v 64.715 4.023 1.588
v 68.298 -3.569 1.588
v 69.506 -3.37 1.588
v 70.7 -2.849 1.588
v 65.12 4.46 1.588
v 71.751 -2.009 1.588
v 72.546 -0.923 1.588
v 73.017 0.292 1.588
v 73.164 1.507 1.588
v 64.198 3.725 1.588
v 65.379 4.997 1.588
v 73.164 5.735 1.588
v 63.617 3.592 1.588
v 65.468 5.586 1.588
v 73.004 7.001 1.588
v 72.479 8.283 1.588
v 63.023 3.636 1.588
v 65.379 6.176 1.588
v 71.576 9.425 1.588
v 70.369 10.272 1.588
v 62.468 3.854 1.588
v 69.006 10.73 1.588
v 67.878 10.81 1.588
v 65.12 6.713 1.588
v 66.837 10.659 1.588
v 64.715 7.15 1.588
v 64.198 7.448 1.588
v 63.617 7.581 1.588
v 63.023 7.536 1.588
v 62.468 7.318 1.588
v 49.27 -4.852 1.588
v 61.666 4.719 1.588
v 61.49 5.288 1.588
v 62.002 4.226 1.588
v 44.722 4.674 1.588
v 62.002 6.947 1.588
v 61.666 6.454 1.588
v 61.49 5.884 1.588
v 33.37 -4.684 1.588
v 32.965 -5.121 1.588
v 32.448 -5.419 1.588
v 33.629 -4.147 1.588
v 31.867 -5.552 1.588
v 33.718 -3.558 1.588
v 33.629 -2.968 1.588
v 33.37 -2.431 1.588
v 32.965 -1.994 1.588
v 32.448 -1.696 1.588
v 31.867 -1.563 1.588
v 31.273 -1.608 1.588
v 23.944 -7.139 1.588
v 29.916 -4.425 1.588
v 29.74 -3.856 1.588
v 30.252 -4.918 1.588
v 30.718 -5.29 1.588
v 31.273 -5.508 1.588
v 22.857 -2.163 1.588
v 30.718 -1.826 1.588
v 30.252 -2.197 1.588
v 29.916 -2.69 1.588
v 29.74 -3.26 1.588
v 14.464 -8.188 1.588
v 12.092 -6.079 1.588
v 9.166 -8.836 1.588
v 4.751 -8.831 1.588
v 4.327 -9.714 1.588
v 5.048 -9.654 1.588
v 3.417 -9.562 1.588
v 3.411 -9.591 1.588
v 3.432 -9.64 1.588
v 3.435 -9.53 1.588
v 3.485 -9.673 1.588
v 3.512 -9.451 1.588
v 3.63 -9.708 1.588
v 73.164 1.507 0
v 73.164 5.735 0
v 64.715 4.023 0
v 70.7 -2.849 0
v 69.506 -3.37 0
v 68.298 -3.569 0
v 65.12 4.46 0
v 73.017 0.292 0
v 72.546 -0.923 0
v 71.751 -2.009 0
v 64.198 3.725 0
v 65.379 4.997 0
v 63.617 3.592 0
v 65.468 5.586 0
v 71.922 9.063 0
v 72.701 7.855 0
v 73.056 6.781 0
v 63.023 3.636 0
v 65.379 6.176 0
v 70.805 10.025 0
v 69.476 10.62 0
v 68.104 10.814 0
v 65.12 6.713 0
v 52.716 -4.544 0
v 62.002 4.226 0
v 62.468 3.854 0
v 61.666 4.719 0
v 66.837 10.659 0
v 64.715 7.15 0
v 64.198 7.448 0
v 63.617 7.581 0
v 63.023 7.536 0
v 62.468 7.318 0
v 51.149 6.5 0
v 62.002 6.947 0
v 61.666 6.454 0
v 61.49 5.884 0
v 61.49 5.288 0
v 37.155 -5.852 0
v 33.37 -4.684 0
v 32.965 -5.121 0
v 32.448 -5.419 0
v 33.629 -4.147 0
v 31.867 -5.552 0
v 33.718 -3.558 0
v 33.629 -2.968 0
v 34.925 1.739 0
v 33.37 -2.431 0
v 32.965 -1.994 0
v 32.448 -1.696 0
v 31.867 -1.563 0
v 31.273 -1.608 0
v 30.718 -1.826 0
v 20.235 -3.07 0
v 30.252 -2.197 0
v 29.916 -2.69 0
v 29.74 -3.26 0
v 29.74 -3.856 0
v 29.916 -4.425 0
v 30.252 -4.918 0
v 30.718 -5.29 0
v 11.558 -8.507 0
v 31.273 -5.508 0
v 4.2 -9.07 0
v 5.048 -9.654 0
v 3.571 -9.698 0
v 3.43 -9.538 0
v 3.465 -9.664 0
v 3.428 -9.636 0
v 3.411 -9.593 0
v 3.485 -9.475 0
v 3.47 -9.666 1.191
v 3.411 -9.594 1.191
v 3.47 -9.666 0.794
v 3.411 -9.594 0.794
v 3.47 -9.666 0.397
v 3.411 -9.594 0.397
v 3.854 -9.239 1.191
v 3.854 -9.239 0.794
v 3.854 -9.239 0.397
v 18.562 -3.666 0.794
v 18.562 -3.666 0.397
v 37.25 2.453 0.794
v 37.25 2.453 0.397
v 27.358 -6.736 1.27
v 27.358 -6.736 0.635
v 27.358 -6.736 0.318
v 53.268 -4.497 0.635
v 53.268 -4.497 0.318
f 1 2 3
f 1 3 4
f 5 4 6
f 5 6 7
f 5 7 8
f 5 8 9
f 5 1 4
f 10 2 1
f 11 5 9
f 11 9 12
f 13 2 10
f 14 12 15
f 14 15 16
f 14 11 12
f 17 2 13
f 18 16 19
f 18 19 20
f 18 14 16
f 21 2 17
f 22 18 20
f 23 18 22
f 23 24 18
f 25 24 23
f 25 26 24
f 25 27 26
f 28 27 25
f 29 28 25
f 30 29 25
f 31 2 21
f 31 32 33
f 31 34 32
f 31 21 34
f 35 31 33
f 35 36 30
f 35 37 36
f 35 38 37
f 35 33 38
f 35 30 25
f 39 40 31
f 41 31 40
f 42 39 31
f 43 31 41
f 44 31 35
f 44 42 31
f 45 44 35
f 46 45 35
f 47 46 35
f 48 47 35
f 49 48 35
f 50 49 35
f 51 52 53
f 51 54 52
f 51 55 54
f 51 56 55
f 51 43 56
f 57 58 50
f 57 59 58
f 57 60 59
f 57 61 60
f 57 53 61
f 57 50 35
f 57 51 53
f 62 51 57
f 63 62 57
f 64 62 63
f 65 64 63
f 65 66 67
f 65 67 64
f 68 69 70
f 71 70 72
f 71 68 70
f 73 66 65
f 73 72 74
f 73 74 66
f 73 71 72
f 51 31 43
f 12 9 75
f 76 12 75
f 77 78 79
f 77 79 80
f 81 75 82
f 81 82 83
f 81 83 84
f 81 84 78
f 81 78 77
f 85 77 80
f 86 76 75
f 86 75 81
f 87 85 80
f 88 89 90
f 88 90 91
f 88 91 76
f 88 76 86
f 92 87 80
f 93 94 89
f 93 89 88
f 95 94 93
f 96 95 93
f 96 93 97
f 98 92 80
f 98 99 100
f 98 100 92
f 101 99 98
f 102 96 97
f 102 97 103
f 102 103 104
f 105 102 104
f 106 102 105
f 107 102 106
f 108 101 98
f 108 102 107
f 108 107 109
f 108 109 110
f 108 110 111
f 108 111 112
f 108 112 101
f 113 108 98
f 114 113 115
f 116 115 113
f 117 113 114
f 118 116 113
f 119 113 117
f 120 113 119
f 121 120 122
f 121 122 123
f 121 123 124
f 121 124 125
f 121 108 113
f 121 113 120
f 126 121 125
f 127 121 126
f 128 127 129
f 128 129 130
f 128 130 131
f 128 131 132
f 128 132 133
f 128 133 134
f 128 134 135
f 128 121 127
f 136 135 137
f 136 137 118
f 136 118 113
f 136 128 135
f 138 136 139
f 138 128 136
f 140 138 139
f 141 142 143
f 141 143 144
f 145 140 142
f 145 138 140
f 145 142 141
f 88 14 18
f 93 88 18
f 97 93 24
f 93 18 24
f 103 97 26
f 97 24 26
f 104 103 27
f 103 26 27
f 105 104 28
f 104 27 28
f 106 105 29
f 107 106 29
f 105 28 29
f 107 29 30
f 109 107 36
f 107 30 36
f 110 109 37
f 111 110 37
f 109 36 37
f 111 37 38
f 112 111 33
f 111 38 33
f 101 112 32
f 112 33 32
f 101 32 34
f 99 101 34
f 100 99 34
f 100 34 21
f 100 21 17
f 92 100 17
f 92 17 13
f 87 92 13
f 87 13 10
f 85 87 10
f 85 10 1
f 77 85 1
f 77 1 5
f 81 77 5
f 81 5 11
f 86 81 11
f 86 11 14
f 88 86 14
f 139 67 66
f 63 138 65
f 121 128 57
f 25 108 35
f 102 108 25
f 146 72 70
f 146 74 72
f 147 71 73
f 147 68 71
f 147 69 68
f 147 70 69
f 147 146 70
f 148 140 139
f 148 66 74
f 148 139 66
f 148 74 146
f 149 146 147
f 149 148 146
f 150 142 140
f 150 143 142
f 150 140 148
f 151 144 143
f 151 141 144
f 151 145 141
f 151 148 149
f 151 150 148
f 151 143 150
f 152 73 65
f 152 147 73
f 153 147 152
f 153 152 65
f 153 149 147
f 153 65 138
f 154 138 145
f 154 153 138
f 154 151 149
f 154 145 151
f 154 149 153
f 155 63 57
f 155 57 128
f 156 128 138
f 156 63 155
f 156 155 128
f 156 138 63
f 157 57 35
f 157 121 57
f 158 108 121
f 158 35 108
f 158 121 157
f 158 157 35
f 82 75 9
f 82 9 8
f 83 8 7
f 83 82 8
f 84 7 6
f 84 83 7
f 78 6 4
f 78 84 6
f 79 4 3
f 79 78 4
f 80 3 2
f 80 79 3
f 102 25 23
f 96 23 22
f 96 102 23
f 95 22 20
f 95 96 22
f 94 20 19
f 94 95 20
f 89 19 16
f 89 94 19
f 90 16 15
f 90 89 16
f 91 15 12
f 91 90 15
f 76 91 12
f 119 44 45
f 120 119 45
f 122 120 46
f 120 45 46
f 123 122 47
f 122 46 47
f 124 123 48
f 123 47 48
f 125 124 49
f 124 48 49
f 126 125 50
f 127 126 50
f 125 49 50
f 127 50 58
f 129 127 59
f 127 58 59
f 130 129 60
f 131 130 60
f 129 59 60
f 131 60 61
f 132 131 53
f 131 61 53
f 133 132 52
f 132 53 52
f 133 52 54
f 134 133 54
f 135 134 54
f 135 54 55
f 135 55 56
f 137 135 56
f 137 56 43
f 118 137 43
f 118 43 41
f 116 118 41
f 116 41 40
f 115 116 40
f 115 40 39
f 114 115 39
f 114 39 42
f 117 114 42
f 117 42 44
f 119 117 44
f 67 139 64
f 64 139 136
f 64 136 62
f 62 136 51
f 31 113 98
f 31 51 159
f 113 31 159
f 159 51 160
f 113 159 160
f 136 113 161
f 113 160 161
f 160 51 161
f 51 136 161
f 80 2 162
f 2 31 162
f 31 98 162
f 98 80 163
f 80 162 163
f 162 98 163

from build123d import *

# Parameters (mm, degrees)
BOSS_EXTRUDE1_DEPTH       = 226.06
CUT_EXTRUDE1_DEPTH        = 248.603669875
CUT_EXTRUDE1_DEPTH_BACK   = 248.603669875
FILLET1_R                 = 5.08
SHELL1_START              = 31.75
SHELL1_DEPTH              = 162.56
SHELL1_START_2            = 3.175
SHELL1_2_DEPTH            = 219.71
SKETCH3_R                 = 2.032
CUT_EXTRUDE2_DEPTH        = 246.233624371
BOSS_EXTRUDE2_START       = -4.025198094
BOSS_EXTRUDE2_OUTLINE_R   = 1.5875
BOSS_EXTRUDE2_DEPTH       = 5.811624811
BOSS_EXTRUDE2_START_2     = -8.955775483
BOSS_EXTRUDE2_2_OUTLINE_R = 1.5875
BOSS_EXTRUDE2_2_DEPTH     = 4.930577389
CUT_EXTRUDE3_DEPTH        = 246.233624371
CUT_EXTRUDE3_DEPTH_BACK   = 246.233624371
SKETCH5_W                 = 235.931423423
SKETCH5_H                 = 77.627996968
SKETCH6_R                 = 2
CUT_EXTRUDE4_DEPTH        = 74.976362333


# Read off the part's stored shape, not the designer's step: Shell1, Boss-Extrude2
with BuildPart() as part:
    # Sketch1 → Boss-Extrude1 (new body)
    with BuildSketch(Plane.XY):
        with BuildLine():
            Line((99.32639085, 18.404394796), (99.32639085, -2.986448862))
            add(Edge.make_bspline(
                [(5.047603806, -9.653713384), (9.482649657, -8.546128483), (16.988483729, -8.076906091), (30.336595099, -6.254410192), (41.946659702, -5.566037344), (65.865842143, -3.231342143), (83.974811725, -3.089086557), (99.32639085, -2.986448862)],
                knots=[0, 0, 0, 0, 0.144322392, 0.237947652, 0.42712275, 0.512831912, 1, 1, 1, 1], degree=3))
            add(Edge.make_bspline(
                [(5.047603806, -9.653713384), (1.304537033, -10.042523479), (11.503328192, -6.353494655), (19.723627138, -3.092777487), (52.915151131, 7.645918304), (77.889766355, 13.460013374), (99.32639085, 18.404394796)],
                knots=[0, 0, 0, 0, 0.059914523, 0.175786391, 0.369274689, 1, 1, 1, 1], degree=3))
        make_face()
    extrude(amount=BOSS_EXTRUDE1_DEPTH)

    # Sketch2 → Cut-Extrude1 (cut, two sides: drawn at the far end of the back side and taken through both)
    with BuildSketch(Plane(origin=(0, 0, 0), x_dir=(1, 0, 0), z_dir=(0, 1, 0)).offset(-CUT_EXTRUDE1_DEPTH_BACK)):
        Polygon((169.681502528, 0), (169.681502528, -226.06), (73.16439085, -226.06), (73.16439085, -197.485), (93.73839085, -197.485), (93.73839085, -28.575), (73.16439085, -28.575), (73.16439085, 0), align=None)
    extrude(amount=CUT_EXTRUDE1_DEPTH + CUT_EXTRUDE1_DEPTH_BACK, mode=Mode.SUBTRACT)

    # Fillet1
    fillet1_edges = [part.edges().sort_by_distance(p)[0] for p in [
        (73.16439085, -3.388889971, 14.2875),
        (73.16439085, 12.236004014, 14.2875),
        (93.73839085, -3.026654485, 113.03),
        (93.73839085, 17.113551214, 113.03),
        (73.16439085, -3.388889971, 211.7725),
        (73.16439085, 12.236004014, 211.7725),
    ]]
    fillet(fillet1_edges, radius=FILLET1_R)

    # Shell1 outline → Shell1 (cut)
    with BuildSketch(Plane.XY.offset(SHELL1_START)):
        with BuildLine():
            ThreePointArc((90.56339085, 10.716231692), (89.84210345, 12.208829924), (88.224441264, 12.571147528))
            add(Edge.make_bspline(
                [(88.224441264, 12.571147528), (87.199954726, 12.331473265), (86.178161178, 12.091844736), (85.158893539, 11.852170354), (84.141984638, 11.612358579), (83.127267128, 11.372317854), (82.11457348, 11.131956606), (81.103735991, 10.891183246), (80.094586779, 10.649906167), (79.086957782, 10.408033746), (78.080680762, 10.165474344), (77.075587303, 9.922136302), (75.365261077, 9.50615692), (74.659515429, 9.333955274), (73.95421322, 9.161291111), (73.24929575, 8.988132524), (72.544704275, 8.814447596), (71.84038, 8.640204402), (71.136264087, 8.465371009), (70.432297655, 8.289915474), (69.728421779, 8.113805846), (69.024577498, 7.937010164), (68.320705808, 7.759496459), (67.616747671, 7.581232754)],
                knots=[0.118068853, 0.118068853, 0.118068853, 0.118068853, 0.118068853, 0.118068853, 0.118068853, 0.118068853, 0.118068853, 0.118068853, 0.118068853, 0.118068853, 0.118068853, 0.242924315, 0.242924315, 0.242924315, 0.242924315, 0.242924315, 0.242924315, 0.242924315, 0.242924315, 0.242924315, 0.242924315, 0.242924315, 0.330745026, 0.330745026, 0.330745026, 0.330745026, 0.330745026, 0.330745026, 0.330745026, 0.330745026, 0.330745026, 0.330745026, 0.330745026, 0.330745026, 0.330745026], degree=12))
            ThreePointArc((67.616747671, 7.581232754), (69.254468773, 7.237834237), (69.98939085, 5.734523672))
            Line((69.98939085, 5.734523672), (69.98939085, 1.506513014))
            ThreePointArc((69.98939085, 1.506513014), (69.459523341, 0.188167221), (68.164681525, -0.396794214))
            add(Edge.make_bspline(
                [(68.164681525, -0.396794214), (68.694992172, -0.374423154), (69.225275053, -0.352727917), (69.755528584, -0.331695291), (70.285751179, -0.311312074), (70.815941255, -0.291565067), (71.346097229, -0.272441078), (71.876217523, -0.25392692), (72.406300557, -0.236009412), (72.936344753, -0.218675382), (73.466348538, -0.201911658), (73.996310335, -0.18570508), (74.526228574, -0.170042489), (75.056101682, -0.154910735), (76.522372139, -0.114466983), (77.45867021, -0.090254504), (78.394813662, -0.06758666), (79.330793845, -0.046390933), (80.266602102, -0.026594862), (81.202229769, -0.008126042), (82.137668173, 0.009087874), (83.072908636, 0.025119175), (84.007942471, 0.040040096), (84.942760983, 0.053922812), (85.87735547, 0.066839443), (86.811717225, 0.07886205), (87.74583753, 0.09006264), (88.679707661, 0.100513159)],
                knots=[0.67202474, 0.67202474, 0.67202474, 0.67202474, 0.67202474, 0.67202474, 0.67202474, 0.67202474, 0.67202474, 0.67202474, 0.67202474, 0.67202474, 0.67202474, 0.67202474, 0.67202474, 0.75, 0.75, 0.75, 0.75, 0.75, 0.75, 0.75, 0.75, 0.75, 0.75, 0.75, 0.75, 0.75, 0.887817721, 0.887817721, 0.887817721, 0.887817721, 0.887817721, 0.887817721, 0.887817721, 0.887817721, 0.887817721, 0.887817721, 0.887817721, 0.887817721, 0.887817721, 0.887817721, 0.887817721], degree=14))
            ThreePointArc((88.679707661, 0.100513159), (90.012944885, 0.665913267), (90.56339085, 2.0053939))
            Line((90.56339085, 2.0053939), (90.56339085, 10.716231692))
        make_face()
        with BuildLine():
            ThreePointArc((69.98939085, 5.734523672), (69.254468773, 7.237834237), (67.616747644, 7.581232862))
            add(Edge.make_bspline(
                [(67.616747644, 7.581232862), (65.399836461, 7.019843113), (63.182067917, 6.451015332), (60.961598132, 5.873750666), (58.736579605, 5.2870495), (56.505161763, 4.689911333), (54.265491496, 4.081334769), (52.015713682, 3.460317509), (49.753971716, 2.825856339), (47.478408044, 2.176947117), (45.187164685, 1.512584769), (42.878383765, 0.831763272), (40.358491497, 0.075974277), (40.166643435, 0.018354472), (39.974662823, -0.039384328), (39.782548624, -0.097242688), (39.590299803, -0.155221168), (39.397915321, -0.213320331), (39.205394144, -0.271540739), (39.012735233, -0.329882954), (38.819937552, -0.388347539), (38.627000064, -0.446935056), (38.433921733, -0.505646067), (38.047481311, -0.6233162), (37.854115889, -0.68227633), (37.660618706, -0.741357704), (37.46700324, -0.800556496), (37.273282999, -0.859868869), (37.079471514, -0.919290978), (36.885582349, -0.97881897), (36.69162909, -1.038448983), (36.497625354, -1.098177145), (36.303584785, -1.157999576), (36.109521054, -1.217912388), (35.527301471, -1.397910273), (35.139116839, -1.518254909), (34.751002758, -1.638914656), (34.363068079, -1.759858551), (33.975421705, -1.881055606), (33.588172595, -2.002474805), (33.20142976, -2.124085105), (32.815302268, -2.245855438), (32.429899238, -2.367754709), (32.045329846, -2.489751794), (31.66170332, -2.611815547), (31.123971117, -2.783433666), (30.968986334, -2.832958389), (30.814181899, -2.882486873), (30.659565113, -2.93201703), (30.505143284, -2.981546776), (30.350923715, -3.031074022), (30.196913716, -3.080596682), (30.043120596, -3.130112665), (29.889551668, -3.179619883), (29.736214245, -3.229116246), (29.583115647, -3.27859966), (29.430263192, -3.328068033)],
                knots=[0.330745026, 0.330745026, 0.330745026, 0.330745026, 0.330745026, 0.330745026, 0.330745026, 0.330745026, 0.330745026, 0.330745026, 0.330745026, 0.330745026, 0.330745026, 0.607310788, 0.607310788, 0.607310788, 0.607310788, 0.607310788, 0.607310788, 0.607310788, 0.607310788, 0.607310788, 0.607310788, 0.607310788, 0.630084943, 0.630084943, 0.630084943, 0.630084943, 0.630084943, 0.630084943, 0.630084943, 0.630084943, 0.630084943, 0.630084943, 0.630084943, 0.652859097, 0.652859097, 0.652859097, 0.652859097, 0.652859097, 0.652859097, 0.652859097, 0.652859097, 0.652859097, 0.652859097, 0.652859097, 0.698407406, 0.698407406, 0.698407406, 0.698407406, 0.698407406, 0.698407406, 0.698407406, 0.698407406, 0.698407406, 0.698407406, 0.698407406, 0.716880093, 0.716880093, 0.716880093, 0.716880093, 0.716880093, 0.716880093, 0.716880093, 0.716880093, 0.716880093, 0.716880093, 0.716880093, 0.716880093, 0.716880093], degree=12))
            add(Edge.make_bspline(
                [(29.430263192, -3.328068033), (30.192321788, -3.253103705), (30.953742852, -3.181055792), (31.714498333, -3.111652976), (32.474560286, -3.044625223), (33.233901052, -2.979703638), (33.992493217, -2.916620464), (34.750309569, -2.855109092), (35.507323058, -2.794904058), (36.26350675, -2.735741051), (37.018833789, -2.677356913), (37.77327735, -2.619489644), (38.526810601, -2.561878406), (39.27940666, -2.504263523), (40.241275886, -2.430197827), (40.451437795, -2.413988578), (40.661523692, -2.397753121), (40.871532992, -2.381485838), (41.081465111, -2.36518111), (41.291319462, -2.34883332), (41.501095461, -2.332436848), (41.710792523, -2.315986075), (41.920410064, -2.299475384), (42.129947497, -2.282899155), (42.339404239, -2.266251771), (42.548779704, -2.249527611), (42.758073307, -2.232721059), (43.071890042, -2.207379213), (43.176475009, -2.198909942), (43.281039293, -2.190417989), (43.38558282, -2.181902656), (43.490105518, -2.173363251), (43.594607315, -2.164799076), (43.699088138, -2.156209439), (43.803547915, -2.147593642), (43.907986571, -2.138950992), (44.012404037, -2.130280793), (44.116800238, -2.12158235), (44.221175102, -2.112854969), (44.325528557, -2.104097954), (44.482026516, -2.090916937), (44.534185416, -2.08651578), (44.586353102, -2.082106088), (44.638462372, -2.077692142), (44.690677468, -2.073262507), (44.74276457, -2.068834253), (44.79486261, -2.064396055), (44.84709011, -2.05993977), (44.899190406, -2.055485443), (44.951182515, -2.051030032), (45.003429676, -2.046545196), (45.055514905, -2.042065555), (45.107662823, -2.037572174), (45.211955574, -2.028569312), (45.264108442, -2.024059127), (45.316267814, -2.019540326), (45.368433702, -2.015013048), (45.42060612, -2.010477431), (45.472785076, -2.005933613), (45.524970589, -2.001381732), (45.577162664, -1.996821927), (45.629361319, -1.992254336), (45.681566563, -1.987679097), (45.73377841, -1.983096348), (45.785996871, -1.978506228), (45.838221958, -1.973908876), (46.3083075, -1.93246885), (46.726586222, -1.895179261), (47.145296128, -1.857506655), (47.564443519, -1.819522312), (47.98403472, -1.781297798), (48.404076086, -1.742904961), (48.824573993, -1.704415937), (49.24553485, -1.665903148), (49.66696508, -1.627439299), (50.088871145, -1.589097383), (50.511259522, -1.550950675), (50.934136722, -1.513072738), (51.357509275, -1.47553742), (51.834368049, -1.433779033), (51.8873602, -1.429145723), (51.940360205, -1.424519069), (51.993368079, -1.419899217), (52.046383832, -1.415286311), (52.099407479, -1.410680497), (52.152439032, -1.40608192), (52.205478504, -1.401490725), (52.258525908, -1.396907058), (52.311581256, -1.392331062), (52.364644562, -1.387762884), (52.417715838, -1.38320267), (52.470795096, -1.378650563), (52.576969604, -1.369562855), (52.630062039, -1.365027462), (52.683179331, -1.360499209), (52.736263003, -1.355982684), (52.78940087, -1.351471194), (52.842545574, -1.346968801), (52.895651993, -1.342479031), (52.948780943, -1.337996995), (53.001972248, -1.333519945), (53.055147327, -1.329054684), (53.108262643, -1.324604451), (53.161436979, -1.320159017), (53.214588182, -1.31572572), (53.37405314, -1.302454763), (53.48036356, -1.293647424), (53.586674415, -1.284879943), (53.692985692, -1.276152212), (53.799297377, -1.267464124), (53.905609457, -1.258815573), (54.011921919, -1.25020645), (54.118234749, -1.241636649), (54.224547934, -1.233106063), (54.330861461, -1.224614583), (54.437175316, -1.216162103), (54.543489487, -1.207748516), (54.649803959, -1.199373714), (54.96874824, -1.174365343), (55.181378913, -1.157847807), (55.394010633, -1.141484125), (55.606643294, -1.125273441), (55.819276791, -1.109214898), (56.031911017, -1.093307639), (56.244545869, -1.077550807), (56.457181238, -1.061943545), (56.669817021, -1.046484998), (56.882453112, -1.031174307), (57.095089404, -1.016010616), (57.307725793, -1.000993068), (57.520362172, -0.986120806), (58.158270965, -0.941937311), (58.583543022, -0.913059346), (59.008813776, -0.884752245), (59.434082397, -0.857009171), (59.859348051, -0.829823289), (60.284609909, -0.803187765), (60.709867137, -0.777095761), (61.135118907, -0.751540443), (61.560364383, -0.726514975), (61.985602738, -0.702012521), (62.410833137, -0.678026246), (62.83605475, -0.654549315), (63.261266746, -0.631574892), (64.006388166, -0.592183223), (64.32630213, -0.575550919), (64.646209835, -0.559196323), (64.96611093, -0.543116532), (65.286005067, -0.527308639), (65.605891895, -0.511769741), (65.925771064, -0.496496937), (66.245642227, -0.481487322), (66.565505034, -0.466737997), (66.885359135, -0.45224606), (67.205204184, -0.438008612), (67.52503983, -0.424022754), (67.844865727, -0.410285587), (68.164681525, -0.396794215)],
                knots=[0.263276283, 0.263276283, 0.263276283, 0.263276283, 0.263276283, 0.263276283, 0.263276283, 0.263276283, 0.263276283, 0.263276283, 0.263276283, 0.263276283, 0.263276283, 0.263276283, 0.263276283, 0.375, 0.375, 0.375, 0.375, 0.375, 0.375, 0.375, 0.375, 0.375, 0.375, 0.375, 0.375, 0.375, 0.40625, 0.40625, 0.40625, 0.40625, 0.40625, 0.40625, 0.40625, 0.40625, 0.40625, 0.40625, 0.40625, 0.40625, 0.40625, 0.421875, 0.421875, 0.421875, 0.421875, 0.421875, 0.421875, 0.421875, 0.421875, 0.421875, 0.421875, 0.421875, 0.421875, 0.421875, 0.4296875, 0.4296875, 0.4296875, 0.4296875, 0.4296875, 0.4296875, 0.4296875, 0.4296875, 0.4296875, 0.4296875, 0.4296875, 0.4296875, 0.4296875, 0.4375, 0.4375, 0.4375, 0.4375, 0.4375, 0.4375, 0.4375, 0.4375, 0.4375, 0.4375, 0.4375, 0.4375, 0.4375, 0.5, 0.5, 0.5, 0.5, 0.5, 0.5, 0.5, 0.5, 0.5, 0.5, 0.5, 0.5, 0.5, 0.5078125, 0.5078125, 0.5078125, 0.5078125, 0.5078125, 0.5078125, 0.5078125, 0.5078125, 0.5078125, 0.5078125, 0.5078125, 0.5078125, 0.5078125, 0.515625, 0.515625, 0.515625, 0.515625, 0.515625, 0.515625, 0.515625, 0.515625, 0.515625, 0.515625, 0.515625, 0.515625, 0.515625, 0.53125, 0.53125, 0.53125, 0.53125, 0.53125, 0.53125, 0.53125, 0.53125, 0.53125, 0.53125, 0.53125, 0.53125, 0.53125, 0.5625, 0.5625, 0.5625, 0.5625, 0.5625, 0.5625, 0.5625, 0.5625, 0.5625, 0.5625, 0.5625, 0.5625, 0.5625, 0.625, 0.625, 0.625, 0.625, 0.625, 0.625, 0.625, 0.625, 0.625, 0.625, 0.625, 0.625, 0.625, 0.67202474, 0.67202474, 0.67202474, 0.67202474, 0.67202474, 0.67202474, 0.67202474, 0.67202474, 0.67202474, 0.67202474, 0.67202474, 0.67202474, 0.67202474, 0.67202474, 0.67202474], degree=14))
            ThreePointArc((68.164681525, -0.396794215), (69.459523341, 0.188167221), (69.98939085, 1.506513014))
            Line((69.98939085, 1.506513014), (69.98939085, 5.734523672))
        make_face()
    extrude(amount=SHELL1_DEPTH, mode=Mode.SUBTRACT)

    # Shell1 2 outline → Shell1 2 (cut)
    with BuildSketch(Plane.XY.offset(SHELL1_START_2)):
        with BuildLine():
            ThreePointArc((69.98939085, 5.734523672), (69.254468773, 7.237834237), (67.616747644, 7.581232862))
            add(Edge.make_bspline(
                [(67.616747644, 7.581232862), (65.399836461, 7.019843113), (63.182067917, 6.451015332), (60.961598132, 5.873750666), (58.736579605, 5.2870495), (56.505161763, 4.689911333), (54.265491496, 4.081334769), (52.015713682, 3.460317509), (49.753971716, 2.825856339), (47.478408044, 2.176947117), (45.187164685, 1.512584769), (42.878383765, 0.831763272), (40.358491497, 0.075974277), (40.166643435, 0.018354472), (39.974662823, -0.039384328), (39.782548624, -0.097242688), (39.590299803, -0.155221168), (39.397915321, -0.213320331), (39.205394144, -0.271540739), (39.012735233, -0.329882954), (38.819937552, -0.388347539), (38.627000064, -0.446935056), (38.433921733, -0.505646067), (38.047481311, -0.6233162), (37.854115889, -0.68227633), (37.660618706, -0.741357704), (37.46700324, -0.800556496), (37.273282999, -0.859868869), (37.079471514, -0.919290978), (36.885582349, -0.97881897), (36.69162909, -1.038448983), (36.497625354, -1.098177145), (36.303584785, -1.157999576), (36.109521054, -1.217912388), (35.527301471, -1.397910273), (35.139116839, -1.518254909), (34.751002758, -1.638914656), (34.363068079, -1.759858551), (33.975421705, -1.881055606), (33.588172595, -2.002474805), (33.20142976, -2.124085105), (32.815302268, -2.245855438), (32.429899238, -2.367754709), (32.045329846, -2.489751794), (31.66170332, -2.611815547), (31.123971117, -2.783433666), (30.968986334, -2.832958389), (30.814181899, -2.882486873), (30.659565113, -2.93201703), (30.505143284, -2.981546776), (30.350923715, -3.031074022), (30.196913716, -3.080596682), (30.043120596, -3.130112665), (29.889551668, -3.179619883), (29.736214245, -3.229116246), (29.583115647, -3.27859966), (29.430263192, -3.328068033)],
                knots=[0.330745026, 0.330745026, 0.330745026, 0.330745026, 0.330745026, 0.330745026, 0.330745026, 0.330745026, 0.330745026, 0.330745026, 0.330745026, 0.330745026, 0.330745026, 0.607310788, 0.607310788, 0.607310788, 0.607310788, 0.607310788, 0.607310788, 0.607310788, 0.607310788, 0.607310788, 0.607310788, 0.607310788, 0.630084943, 0.630084943, 0.630084943, 0.630084943, 0.630084943, 0.630084943, 0.630084943, 0.630084943, 0.630084943, 0.630084943, 0.630084943, 0.652859097, 0.652859097, 0.652859097, 0.652859097, 0.652859097, 0.652859097, 0.652859097, 0.652859097, 0.652859097, 0.652859097, 0.652859097, 0.698407406, 0.698407406, 0.698407406, 0.698407406, 0.698407406, 0.698407406, 0.698407406, 0.698407406, 0.698407406, 0.698407406, 0.698407406, 0.716880093, 0.716880093, 0.716880093, 0.716880093, 0.716880093, 0.716880093, 0.716880093, 0.716880093, 0.716880093, 0.716880093, 0.716880093, 0.716880093, 0.716880093], degree=12))
            add(Edge.make_bspline(
                [(29.430263192, -3.328068033), (30.192321788, -3.253103705), (30.953742852, -3.181055792), (31.714498333, -3.111652976), (32.474560286, -3.044625223), (33.233901052, -2.979703638), (33.992493217, -2.916620464), (34.750309569, -2.855109092), (35.507323058, -2.794904058), (36.26350675, -2.735741051), (37.018833789, -2.677356913), (37.77327735, -2.619489644), (38.526810601, -2.561878406), (39.27940666, -2.504263523), (40.241275886, -2.430197827), (40.451437795, -2.413988578), (40.661523692, -2.397753121), (40.871532992, -2.381485838), (41.081465111, -2.36518111), (41.291319462, -2.34883332), (41.501095461, -2.332436848), (41.710792523, -2.315986075), (41.920410064, -2.299475384), (42.129947497, -2.282899155), (42.339404239, -2.266251771), (42.548779704, -2.249527611), (42.758073307, -2.232721059), (43.071890042, -2.207379213), (43.176475009, -2.198909942), (43.281039293, -2.190417989), (43.38558282, -2.181902656), (43.490105518, -2.173363251), (43.594607315, -2.164799076), (43.699088138, -2.156209439), (43.803547915, -2.147593642), (43.907986571, -2.138950992), (44.012404037, -2.130280793), (44.116800238, -2.12158235), (44.221175102, -2.112854969), (44.325528557, -2.104097954), (44.482026516, -2.090916937), (44.534185416, -2.08651578), (44.586353102, -2.082106088), (44.638462372, -2.077692142), (44.690677468, -2.073262507), (44.74276457, -2.068834253), (44.79486261, -2.064396055), (44.84709011, -2.05993977), (44.899190406, -2.055485443), (44.951182515, -2.051030032), (45.003429676, -2.046545196), (45.055514905, -2.042065555), (45.107662823, -2.037572174), (45.211955574, -2.028569312), (45.264108442, -2.024059127), (45.316267814, -2.019540326), (45.368433702, -2.015013048), (45.42060612, -2.010477431), (45.472785076, -2.005933613), (45.524970589, -2.001381732), (45.577162664, -1.996821927), (45.629361319, -1.992254336), (45.681566563, -1.987679097), (45.73377841, -1.983096348), (45.785996871, -1.978506228), (45.838221958, -1.973908876), (46.3083075, -1.93246885), (46.726586222, -1.895179261), (47.145296128, -1.857506655), (47.564443519, -1.819522312), (47.98403472, -1.781297798), (48.404076086, -1.742904961), (48.824573993, -1.704415937), (49.24553485, -1.665903148), (49.66696508, -1.627439299), (50.088871145, -1.589097383), (50.511259522, -1.550950675), (50.934136722, -1.513072738), (51.357509275, -1.47553742), (51.834368049, -1.433779033), (51.8873602, -1.429145723), (51.940360205, -1.424519069), (51.993368079, -1.419899217), (52.046383832, -1.415286311), (52.099407479, -1.410680497), (52.152439032, -1.40608192), (52.205478504, -1.401490725), (52.258525908, -1.396907058), (52.311581256, -1.392331062), (52.364644562, -1.387762884), (52.417715838, -1.38320267), (52.470795096, -1.378650563), (52.576969604, -1.369562855), (52.630062039, -1.365027462), (52.683179331, -1.360499209), (52.736263003, -1.355982684), (52.78940087, -1.351471194), (52.842545574, -1.346968801), (52.895651993, -1.342479031), (52.948780943, -1.337996995), (53.001972248, -1.333519945), (53.055147327, -1.329054684), (53.108262643, -1.324604451), (53.161436979, -1.320159017), (53.214588182, -1.31572572), (53.37405314, -1.302454763), (53.48036356, -1.293647424), (53.586674415, -1.284879943), (53.692985692, -1.276152212), (53.799297377, -1.267464124), (53.905609457, -1.258815573), (54.011921919, -1.25020645), (54.118234749, -1.241636649), (54.224547934, -1.233106063), (54.330861461, -1.224614583), (54.437175316, -1.216162103), (54.543489487, -1.207748516), (54.649803959, -1.199373714), (54.96874824, -1.174365343), (55.181378913, -1.157847807), (55.394010633, -1.141484125), (55.606643294, -1.125273441), (55.819276791, -1.109214898), (56.031911017, -1.093307639), (56.244545869, -1.077550807), (56.457181238, -1.061943545), (56.669817021, -1.046484998), (56.882453112, -1.031174307), (57.095089404, -1.016010616), (57.307725793, -1.000993068), (57.520362172, -0.986120806), (58.158270965, -0.941937311), (58.583543022, -0.913059346), (59.008813776, -0.884752245), (59.434082397, -0.857009171), (59.859348051, -0.829823289), (60.284609909, -0.803187765), (60.709867137, -0.777095761), (61.135118907, -0.751540443), (61.560364383, -0.726514975), (61.985602738, -0.702012521), (62.410833137, -0.678026246), (62.83605475, -0.654549315), (63.261266746, -0.631574892), (64.006388166, -0.592183223), (64.32630213, -0.575550919), (64.646209835, -0.559196323), (64.96611093, -0.543116532), (65.286005067, -0.527308639), (65.605891895, -0.511769741), (65.925771064, -0.496496937), (66.245642227, -0.481487322), (66.565505034, -0.466737997), (66.885359135, -0.45224606), (67.205204184, -0.438008612), (67.52503983, -0.424022754), (67.844865727, -0.410285587), (68.164681525, -0.396794215)],
                knots=[0.263276283, 0.263276283, 0.263276283, 0.263276283, 0.263276283, 0.263276283, 0.263276283, 0.263276283, 0.263276283, 0.263276283, 0.263276283, 0.263276283, 0.263276283, 0.263276283, 0.263276283, 0.375, 0.375, 0.375, 0.375, 0.375, 0.375, 0.375, 0.375, 0.375, 0.375, 0.375, 0.375, 0.375, 0.40625, 0.40625, 0.40625, 0.40625, 0.40625, 0.40625, 0.40625, 0.40625, 0.40625, 0.40625, 0.40625, 0.40625, 0.40625, 0.421875, 0.421875, 0.421875, 0.421875, 0.421875, 0.421875, 0.421875, 0.421875, 0.421875, 0.421875, 0.421875, 0.421875, 0.421875, 0.4296875, 0.4296875, 0.4296875, 0.4296875, 0.4296875, 0.4296875, 0.4296875, 0.4296875, 0.4296875, 0.4296875, 0.4296875, 0.4296875, 0.4296875, 0.4375, 0.4375, 0.4375, 0.4375, 0.4375, 0.4375, 0.4375, 0.4375, 0.4375, 0.4375, 0.4375, 0.4375, 0.4375, 0.5, 0.5, 0.5, 0.5, 0.5, 0.5, 0.5, 0.5, 0.5, 0.5, 0.5, 0.5, 0.5, 0.5078125, 0.5078125, 0.5078125, 0.5078125, 0.5078125, 0.5078125, 0.5078125, 0.5078125, 0.5078125, 0.5078125, 0.5078125, 0.5078125, 0.5078125, 0.515625, 0.515625, 0.515625, 0.515625, 0.515625, 0.515625, 0.515625, 0.515625, 0.515625, 0.515625, 0.515625, 0.515625, 0.515625, 0.53125, 0.53125, 0.53125, 0.53125, 0.53125, 0.53125, 0.53125, 0.53125, 0.53125, 0.53125, 0.53125, 0.53125, 0.53125, 0.5625, 0.5625, 0.5625, 0.5625, 0.5625, 0.5625, 0.5625, 0.5625, 0.5625, 0.5625, 0.5625, 0.5625, 0.5625, 0.625, 0.625, 0.625, 0.625, 0.625, 0.625, 0.625, 0.625, 0.625, 0.625, 0.625, 0.625, 0.625, 0.67202474, 0.67202474, 0.67202474, 0.67202474, 0.67202474, 0.67202474, 0.67202474, 0.67202474, 0.67202474, 0.67202474, 0.67202474, 0.67202474, 0.67202474, 0.67202474, 0.67202474], degree=14))
            ThreePointArc((68.164681525, -0.396794215), (69.459523341, 0.188167221), (69.98939085, 1.506513014))
            Line((69.98939085, 1.506513014), (69.98939085, 5.734523672))
        make_face()
    extrude(amount=SHELL1_2_DEPTH, mode=Mode.SUBTRACT)

    # Sketch3 → Cut-Extrude2 (cut, through all)
    with BuildSketch(Plane.XY):
        with Locations((84.713563037, 5.874854857)):
            Circle(SKETCH3_R)
    extrude(amount=CUT_EXTRUDE2_DEPTH, mode=Mode.SUBTRACT)

    # Boss-Extrude2 outline → Boss-Extrude2 (add)
    with BuildSketch(Plane(origin=(0, 0.100513169, 0), x_dir=(0, 0, 1), z_dir=(0, -1, 0)).offset(BOSS_EXTRUDE2_START)):
        with Locations((50.8, -50.615235316)):
            Circle(BOSS_EXTRUDE2_OUTLINE_R)
        with Locations((126.965977315, -52.892053199)):
            Circle(BOSS_EXTRUDE2_OUTLINE_R)
        with Locations((203.16597731, -52.892933198)):
            Circle(BOSS_EXTRUDE2_OUTLINE_R)
        with Locations((76.2, -69.665235316)):
            Circle(BOSS_EXTRUDE2_OUTLINE_R)
        with Locations((152.365977315, -71.942053199)):
            Circle(BOSS_EXTRUDE2_OUTLINE_R)
    extrude(amount=BOSS_EXTRUDE2_DEPTH)

    # Boss-Extrude2 2 outline → Boss-Extrude2 2 (add)
    with BuildSketch(Plane(origin=(0, 0.100513169, 0), x_dir=(0, 0, 1), z_dir=(0, -1, 0)).offset(BOSS_EXTRUDE2_START_2)):
        with Locations((76.2, -69.665235316)):
            Circle(BOSS_EXTRUDE2_2_OUTLINE_R)
        with Locations((152.365977315, -71.942053199)):
            Circle(BOSS_EXTRUDE2_2_OUTLINE_R)
    extrude(amount=BOSS_EXTRUDE2_2_DEPTH)

    # Sketch5 → Cut-Extrude3 (cut, two sides: drawn at the far end of the back side and taken through both)
    with BuildSketch(Plane(origin=(0, 0, 0), x_dir=(0, 0, -1), z_dir=(1, 0, 0)).offset(-CUT_EXTRUDE3_DEPTH_BACK)):
        with Locations((-119.553211712, 3.427401288)):
            Rectangle(SKETCH5_W, SKETCH5_H)
    extrude(amount=CUT_EXTRUDE3_DEPTH + CUT_EXTRUDE3_DEPTH_BACK, mode=Mode.SUBTRACT)

    # Sketch6 → Cut-Extrude4 (cut, through all)
    with BuildSketch(Plane.XY.offset(1.5875)):
        with Locations((31.717603806, -3.557713384)):
            Circle(SKETCH6_R)
        with Locations((63.467603806, 5.586286616)):
            Circle(SKETCH6_R)
    extrude(amount=-CUT_EXTRUDE4_DEPTH, mode=Mode.SUBTRACT)


solid = part.part
